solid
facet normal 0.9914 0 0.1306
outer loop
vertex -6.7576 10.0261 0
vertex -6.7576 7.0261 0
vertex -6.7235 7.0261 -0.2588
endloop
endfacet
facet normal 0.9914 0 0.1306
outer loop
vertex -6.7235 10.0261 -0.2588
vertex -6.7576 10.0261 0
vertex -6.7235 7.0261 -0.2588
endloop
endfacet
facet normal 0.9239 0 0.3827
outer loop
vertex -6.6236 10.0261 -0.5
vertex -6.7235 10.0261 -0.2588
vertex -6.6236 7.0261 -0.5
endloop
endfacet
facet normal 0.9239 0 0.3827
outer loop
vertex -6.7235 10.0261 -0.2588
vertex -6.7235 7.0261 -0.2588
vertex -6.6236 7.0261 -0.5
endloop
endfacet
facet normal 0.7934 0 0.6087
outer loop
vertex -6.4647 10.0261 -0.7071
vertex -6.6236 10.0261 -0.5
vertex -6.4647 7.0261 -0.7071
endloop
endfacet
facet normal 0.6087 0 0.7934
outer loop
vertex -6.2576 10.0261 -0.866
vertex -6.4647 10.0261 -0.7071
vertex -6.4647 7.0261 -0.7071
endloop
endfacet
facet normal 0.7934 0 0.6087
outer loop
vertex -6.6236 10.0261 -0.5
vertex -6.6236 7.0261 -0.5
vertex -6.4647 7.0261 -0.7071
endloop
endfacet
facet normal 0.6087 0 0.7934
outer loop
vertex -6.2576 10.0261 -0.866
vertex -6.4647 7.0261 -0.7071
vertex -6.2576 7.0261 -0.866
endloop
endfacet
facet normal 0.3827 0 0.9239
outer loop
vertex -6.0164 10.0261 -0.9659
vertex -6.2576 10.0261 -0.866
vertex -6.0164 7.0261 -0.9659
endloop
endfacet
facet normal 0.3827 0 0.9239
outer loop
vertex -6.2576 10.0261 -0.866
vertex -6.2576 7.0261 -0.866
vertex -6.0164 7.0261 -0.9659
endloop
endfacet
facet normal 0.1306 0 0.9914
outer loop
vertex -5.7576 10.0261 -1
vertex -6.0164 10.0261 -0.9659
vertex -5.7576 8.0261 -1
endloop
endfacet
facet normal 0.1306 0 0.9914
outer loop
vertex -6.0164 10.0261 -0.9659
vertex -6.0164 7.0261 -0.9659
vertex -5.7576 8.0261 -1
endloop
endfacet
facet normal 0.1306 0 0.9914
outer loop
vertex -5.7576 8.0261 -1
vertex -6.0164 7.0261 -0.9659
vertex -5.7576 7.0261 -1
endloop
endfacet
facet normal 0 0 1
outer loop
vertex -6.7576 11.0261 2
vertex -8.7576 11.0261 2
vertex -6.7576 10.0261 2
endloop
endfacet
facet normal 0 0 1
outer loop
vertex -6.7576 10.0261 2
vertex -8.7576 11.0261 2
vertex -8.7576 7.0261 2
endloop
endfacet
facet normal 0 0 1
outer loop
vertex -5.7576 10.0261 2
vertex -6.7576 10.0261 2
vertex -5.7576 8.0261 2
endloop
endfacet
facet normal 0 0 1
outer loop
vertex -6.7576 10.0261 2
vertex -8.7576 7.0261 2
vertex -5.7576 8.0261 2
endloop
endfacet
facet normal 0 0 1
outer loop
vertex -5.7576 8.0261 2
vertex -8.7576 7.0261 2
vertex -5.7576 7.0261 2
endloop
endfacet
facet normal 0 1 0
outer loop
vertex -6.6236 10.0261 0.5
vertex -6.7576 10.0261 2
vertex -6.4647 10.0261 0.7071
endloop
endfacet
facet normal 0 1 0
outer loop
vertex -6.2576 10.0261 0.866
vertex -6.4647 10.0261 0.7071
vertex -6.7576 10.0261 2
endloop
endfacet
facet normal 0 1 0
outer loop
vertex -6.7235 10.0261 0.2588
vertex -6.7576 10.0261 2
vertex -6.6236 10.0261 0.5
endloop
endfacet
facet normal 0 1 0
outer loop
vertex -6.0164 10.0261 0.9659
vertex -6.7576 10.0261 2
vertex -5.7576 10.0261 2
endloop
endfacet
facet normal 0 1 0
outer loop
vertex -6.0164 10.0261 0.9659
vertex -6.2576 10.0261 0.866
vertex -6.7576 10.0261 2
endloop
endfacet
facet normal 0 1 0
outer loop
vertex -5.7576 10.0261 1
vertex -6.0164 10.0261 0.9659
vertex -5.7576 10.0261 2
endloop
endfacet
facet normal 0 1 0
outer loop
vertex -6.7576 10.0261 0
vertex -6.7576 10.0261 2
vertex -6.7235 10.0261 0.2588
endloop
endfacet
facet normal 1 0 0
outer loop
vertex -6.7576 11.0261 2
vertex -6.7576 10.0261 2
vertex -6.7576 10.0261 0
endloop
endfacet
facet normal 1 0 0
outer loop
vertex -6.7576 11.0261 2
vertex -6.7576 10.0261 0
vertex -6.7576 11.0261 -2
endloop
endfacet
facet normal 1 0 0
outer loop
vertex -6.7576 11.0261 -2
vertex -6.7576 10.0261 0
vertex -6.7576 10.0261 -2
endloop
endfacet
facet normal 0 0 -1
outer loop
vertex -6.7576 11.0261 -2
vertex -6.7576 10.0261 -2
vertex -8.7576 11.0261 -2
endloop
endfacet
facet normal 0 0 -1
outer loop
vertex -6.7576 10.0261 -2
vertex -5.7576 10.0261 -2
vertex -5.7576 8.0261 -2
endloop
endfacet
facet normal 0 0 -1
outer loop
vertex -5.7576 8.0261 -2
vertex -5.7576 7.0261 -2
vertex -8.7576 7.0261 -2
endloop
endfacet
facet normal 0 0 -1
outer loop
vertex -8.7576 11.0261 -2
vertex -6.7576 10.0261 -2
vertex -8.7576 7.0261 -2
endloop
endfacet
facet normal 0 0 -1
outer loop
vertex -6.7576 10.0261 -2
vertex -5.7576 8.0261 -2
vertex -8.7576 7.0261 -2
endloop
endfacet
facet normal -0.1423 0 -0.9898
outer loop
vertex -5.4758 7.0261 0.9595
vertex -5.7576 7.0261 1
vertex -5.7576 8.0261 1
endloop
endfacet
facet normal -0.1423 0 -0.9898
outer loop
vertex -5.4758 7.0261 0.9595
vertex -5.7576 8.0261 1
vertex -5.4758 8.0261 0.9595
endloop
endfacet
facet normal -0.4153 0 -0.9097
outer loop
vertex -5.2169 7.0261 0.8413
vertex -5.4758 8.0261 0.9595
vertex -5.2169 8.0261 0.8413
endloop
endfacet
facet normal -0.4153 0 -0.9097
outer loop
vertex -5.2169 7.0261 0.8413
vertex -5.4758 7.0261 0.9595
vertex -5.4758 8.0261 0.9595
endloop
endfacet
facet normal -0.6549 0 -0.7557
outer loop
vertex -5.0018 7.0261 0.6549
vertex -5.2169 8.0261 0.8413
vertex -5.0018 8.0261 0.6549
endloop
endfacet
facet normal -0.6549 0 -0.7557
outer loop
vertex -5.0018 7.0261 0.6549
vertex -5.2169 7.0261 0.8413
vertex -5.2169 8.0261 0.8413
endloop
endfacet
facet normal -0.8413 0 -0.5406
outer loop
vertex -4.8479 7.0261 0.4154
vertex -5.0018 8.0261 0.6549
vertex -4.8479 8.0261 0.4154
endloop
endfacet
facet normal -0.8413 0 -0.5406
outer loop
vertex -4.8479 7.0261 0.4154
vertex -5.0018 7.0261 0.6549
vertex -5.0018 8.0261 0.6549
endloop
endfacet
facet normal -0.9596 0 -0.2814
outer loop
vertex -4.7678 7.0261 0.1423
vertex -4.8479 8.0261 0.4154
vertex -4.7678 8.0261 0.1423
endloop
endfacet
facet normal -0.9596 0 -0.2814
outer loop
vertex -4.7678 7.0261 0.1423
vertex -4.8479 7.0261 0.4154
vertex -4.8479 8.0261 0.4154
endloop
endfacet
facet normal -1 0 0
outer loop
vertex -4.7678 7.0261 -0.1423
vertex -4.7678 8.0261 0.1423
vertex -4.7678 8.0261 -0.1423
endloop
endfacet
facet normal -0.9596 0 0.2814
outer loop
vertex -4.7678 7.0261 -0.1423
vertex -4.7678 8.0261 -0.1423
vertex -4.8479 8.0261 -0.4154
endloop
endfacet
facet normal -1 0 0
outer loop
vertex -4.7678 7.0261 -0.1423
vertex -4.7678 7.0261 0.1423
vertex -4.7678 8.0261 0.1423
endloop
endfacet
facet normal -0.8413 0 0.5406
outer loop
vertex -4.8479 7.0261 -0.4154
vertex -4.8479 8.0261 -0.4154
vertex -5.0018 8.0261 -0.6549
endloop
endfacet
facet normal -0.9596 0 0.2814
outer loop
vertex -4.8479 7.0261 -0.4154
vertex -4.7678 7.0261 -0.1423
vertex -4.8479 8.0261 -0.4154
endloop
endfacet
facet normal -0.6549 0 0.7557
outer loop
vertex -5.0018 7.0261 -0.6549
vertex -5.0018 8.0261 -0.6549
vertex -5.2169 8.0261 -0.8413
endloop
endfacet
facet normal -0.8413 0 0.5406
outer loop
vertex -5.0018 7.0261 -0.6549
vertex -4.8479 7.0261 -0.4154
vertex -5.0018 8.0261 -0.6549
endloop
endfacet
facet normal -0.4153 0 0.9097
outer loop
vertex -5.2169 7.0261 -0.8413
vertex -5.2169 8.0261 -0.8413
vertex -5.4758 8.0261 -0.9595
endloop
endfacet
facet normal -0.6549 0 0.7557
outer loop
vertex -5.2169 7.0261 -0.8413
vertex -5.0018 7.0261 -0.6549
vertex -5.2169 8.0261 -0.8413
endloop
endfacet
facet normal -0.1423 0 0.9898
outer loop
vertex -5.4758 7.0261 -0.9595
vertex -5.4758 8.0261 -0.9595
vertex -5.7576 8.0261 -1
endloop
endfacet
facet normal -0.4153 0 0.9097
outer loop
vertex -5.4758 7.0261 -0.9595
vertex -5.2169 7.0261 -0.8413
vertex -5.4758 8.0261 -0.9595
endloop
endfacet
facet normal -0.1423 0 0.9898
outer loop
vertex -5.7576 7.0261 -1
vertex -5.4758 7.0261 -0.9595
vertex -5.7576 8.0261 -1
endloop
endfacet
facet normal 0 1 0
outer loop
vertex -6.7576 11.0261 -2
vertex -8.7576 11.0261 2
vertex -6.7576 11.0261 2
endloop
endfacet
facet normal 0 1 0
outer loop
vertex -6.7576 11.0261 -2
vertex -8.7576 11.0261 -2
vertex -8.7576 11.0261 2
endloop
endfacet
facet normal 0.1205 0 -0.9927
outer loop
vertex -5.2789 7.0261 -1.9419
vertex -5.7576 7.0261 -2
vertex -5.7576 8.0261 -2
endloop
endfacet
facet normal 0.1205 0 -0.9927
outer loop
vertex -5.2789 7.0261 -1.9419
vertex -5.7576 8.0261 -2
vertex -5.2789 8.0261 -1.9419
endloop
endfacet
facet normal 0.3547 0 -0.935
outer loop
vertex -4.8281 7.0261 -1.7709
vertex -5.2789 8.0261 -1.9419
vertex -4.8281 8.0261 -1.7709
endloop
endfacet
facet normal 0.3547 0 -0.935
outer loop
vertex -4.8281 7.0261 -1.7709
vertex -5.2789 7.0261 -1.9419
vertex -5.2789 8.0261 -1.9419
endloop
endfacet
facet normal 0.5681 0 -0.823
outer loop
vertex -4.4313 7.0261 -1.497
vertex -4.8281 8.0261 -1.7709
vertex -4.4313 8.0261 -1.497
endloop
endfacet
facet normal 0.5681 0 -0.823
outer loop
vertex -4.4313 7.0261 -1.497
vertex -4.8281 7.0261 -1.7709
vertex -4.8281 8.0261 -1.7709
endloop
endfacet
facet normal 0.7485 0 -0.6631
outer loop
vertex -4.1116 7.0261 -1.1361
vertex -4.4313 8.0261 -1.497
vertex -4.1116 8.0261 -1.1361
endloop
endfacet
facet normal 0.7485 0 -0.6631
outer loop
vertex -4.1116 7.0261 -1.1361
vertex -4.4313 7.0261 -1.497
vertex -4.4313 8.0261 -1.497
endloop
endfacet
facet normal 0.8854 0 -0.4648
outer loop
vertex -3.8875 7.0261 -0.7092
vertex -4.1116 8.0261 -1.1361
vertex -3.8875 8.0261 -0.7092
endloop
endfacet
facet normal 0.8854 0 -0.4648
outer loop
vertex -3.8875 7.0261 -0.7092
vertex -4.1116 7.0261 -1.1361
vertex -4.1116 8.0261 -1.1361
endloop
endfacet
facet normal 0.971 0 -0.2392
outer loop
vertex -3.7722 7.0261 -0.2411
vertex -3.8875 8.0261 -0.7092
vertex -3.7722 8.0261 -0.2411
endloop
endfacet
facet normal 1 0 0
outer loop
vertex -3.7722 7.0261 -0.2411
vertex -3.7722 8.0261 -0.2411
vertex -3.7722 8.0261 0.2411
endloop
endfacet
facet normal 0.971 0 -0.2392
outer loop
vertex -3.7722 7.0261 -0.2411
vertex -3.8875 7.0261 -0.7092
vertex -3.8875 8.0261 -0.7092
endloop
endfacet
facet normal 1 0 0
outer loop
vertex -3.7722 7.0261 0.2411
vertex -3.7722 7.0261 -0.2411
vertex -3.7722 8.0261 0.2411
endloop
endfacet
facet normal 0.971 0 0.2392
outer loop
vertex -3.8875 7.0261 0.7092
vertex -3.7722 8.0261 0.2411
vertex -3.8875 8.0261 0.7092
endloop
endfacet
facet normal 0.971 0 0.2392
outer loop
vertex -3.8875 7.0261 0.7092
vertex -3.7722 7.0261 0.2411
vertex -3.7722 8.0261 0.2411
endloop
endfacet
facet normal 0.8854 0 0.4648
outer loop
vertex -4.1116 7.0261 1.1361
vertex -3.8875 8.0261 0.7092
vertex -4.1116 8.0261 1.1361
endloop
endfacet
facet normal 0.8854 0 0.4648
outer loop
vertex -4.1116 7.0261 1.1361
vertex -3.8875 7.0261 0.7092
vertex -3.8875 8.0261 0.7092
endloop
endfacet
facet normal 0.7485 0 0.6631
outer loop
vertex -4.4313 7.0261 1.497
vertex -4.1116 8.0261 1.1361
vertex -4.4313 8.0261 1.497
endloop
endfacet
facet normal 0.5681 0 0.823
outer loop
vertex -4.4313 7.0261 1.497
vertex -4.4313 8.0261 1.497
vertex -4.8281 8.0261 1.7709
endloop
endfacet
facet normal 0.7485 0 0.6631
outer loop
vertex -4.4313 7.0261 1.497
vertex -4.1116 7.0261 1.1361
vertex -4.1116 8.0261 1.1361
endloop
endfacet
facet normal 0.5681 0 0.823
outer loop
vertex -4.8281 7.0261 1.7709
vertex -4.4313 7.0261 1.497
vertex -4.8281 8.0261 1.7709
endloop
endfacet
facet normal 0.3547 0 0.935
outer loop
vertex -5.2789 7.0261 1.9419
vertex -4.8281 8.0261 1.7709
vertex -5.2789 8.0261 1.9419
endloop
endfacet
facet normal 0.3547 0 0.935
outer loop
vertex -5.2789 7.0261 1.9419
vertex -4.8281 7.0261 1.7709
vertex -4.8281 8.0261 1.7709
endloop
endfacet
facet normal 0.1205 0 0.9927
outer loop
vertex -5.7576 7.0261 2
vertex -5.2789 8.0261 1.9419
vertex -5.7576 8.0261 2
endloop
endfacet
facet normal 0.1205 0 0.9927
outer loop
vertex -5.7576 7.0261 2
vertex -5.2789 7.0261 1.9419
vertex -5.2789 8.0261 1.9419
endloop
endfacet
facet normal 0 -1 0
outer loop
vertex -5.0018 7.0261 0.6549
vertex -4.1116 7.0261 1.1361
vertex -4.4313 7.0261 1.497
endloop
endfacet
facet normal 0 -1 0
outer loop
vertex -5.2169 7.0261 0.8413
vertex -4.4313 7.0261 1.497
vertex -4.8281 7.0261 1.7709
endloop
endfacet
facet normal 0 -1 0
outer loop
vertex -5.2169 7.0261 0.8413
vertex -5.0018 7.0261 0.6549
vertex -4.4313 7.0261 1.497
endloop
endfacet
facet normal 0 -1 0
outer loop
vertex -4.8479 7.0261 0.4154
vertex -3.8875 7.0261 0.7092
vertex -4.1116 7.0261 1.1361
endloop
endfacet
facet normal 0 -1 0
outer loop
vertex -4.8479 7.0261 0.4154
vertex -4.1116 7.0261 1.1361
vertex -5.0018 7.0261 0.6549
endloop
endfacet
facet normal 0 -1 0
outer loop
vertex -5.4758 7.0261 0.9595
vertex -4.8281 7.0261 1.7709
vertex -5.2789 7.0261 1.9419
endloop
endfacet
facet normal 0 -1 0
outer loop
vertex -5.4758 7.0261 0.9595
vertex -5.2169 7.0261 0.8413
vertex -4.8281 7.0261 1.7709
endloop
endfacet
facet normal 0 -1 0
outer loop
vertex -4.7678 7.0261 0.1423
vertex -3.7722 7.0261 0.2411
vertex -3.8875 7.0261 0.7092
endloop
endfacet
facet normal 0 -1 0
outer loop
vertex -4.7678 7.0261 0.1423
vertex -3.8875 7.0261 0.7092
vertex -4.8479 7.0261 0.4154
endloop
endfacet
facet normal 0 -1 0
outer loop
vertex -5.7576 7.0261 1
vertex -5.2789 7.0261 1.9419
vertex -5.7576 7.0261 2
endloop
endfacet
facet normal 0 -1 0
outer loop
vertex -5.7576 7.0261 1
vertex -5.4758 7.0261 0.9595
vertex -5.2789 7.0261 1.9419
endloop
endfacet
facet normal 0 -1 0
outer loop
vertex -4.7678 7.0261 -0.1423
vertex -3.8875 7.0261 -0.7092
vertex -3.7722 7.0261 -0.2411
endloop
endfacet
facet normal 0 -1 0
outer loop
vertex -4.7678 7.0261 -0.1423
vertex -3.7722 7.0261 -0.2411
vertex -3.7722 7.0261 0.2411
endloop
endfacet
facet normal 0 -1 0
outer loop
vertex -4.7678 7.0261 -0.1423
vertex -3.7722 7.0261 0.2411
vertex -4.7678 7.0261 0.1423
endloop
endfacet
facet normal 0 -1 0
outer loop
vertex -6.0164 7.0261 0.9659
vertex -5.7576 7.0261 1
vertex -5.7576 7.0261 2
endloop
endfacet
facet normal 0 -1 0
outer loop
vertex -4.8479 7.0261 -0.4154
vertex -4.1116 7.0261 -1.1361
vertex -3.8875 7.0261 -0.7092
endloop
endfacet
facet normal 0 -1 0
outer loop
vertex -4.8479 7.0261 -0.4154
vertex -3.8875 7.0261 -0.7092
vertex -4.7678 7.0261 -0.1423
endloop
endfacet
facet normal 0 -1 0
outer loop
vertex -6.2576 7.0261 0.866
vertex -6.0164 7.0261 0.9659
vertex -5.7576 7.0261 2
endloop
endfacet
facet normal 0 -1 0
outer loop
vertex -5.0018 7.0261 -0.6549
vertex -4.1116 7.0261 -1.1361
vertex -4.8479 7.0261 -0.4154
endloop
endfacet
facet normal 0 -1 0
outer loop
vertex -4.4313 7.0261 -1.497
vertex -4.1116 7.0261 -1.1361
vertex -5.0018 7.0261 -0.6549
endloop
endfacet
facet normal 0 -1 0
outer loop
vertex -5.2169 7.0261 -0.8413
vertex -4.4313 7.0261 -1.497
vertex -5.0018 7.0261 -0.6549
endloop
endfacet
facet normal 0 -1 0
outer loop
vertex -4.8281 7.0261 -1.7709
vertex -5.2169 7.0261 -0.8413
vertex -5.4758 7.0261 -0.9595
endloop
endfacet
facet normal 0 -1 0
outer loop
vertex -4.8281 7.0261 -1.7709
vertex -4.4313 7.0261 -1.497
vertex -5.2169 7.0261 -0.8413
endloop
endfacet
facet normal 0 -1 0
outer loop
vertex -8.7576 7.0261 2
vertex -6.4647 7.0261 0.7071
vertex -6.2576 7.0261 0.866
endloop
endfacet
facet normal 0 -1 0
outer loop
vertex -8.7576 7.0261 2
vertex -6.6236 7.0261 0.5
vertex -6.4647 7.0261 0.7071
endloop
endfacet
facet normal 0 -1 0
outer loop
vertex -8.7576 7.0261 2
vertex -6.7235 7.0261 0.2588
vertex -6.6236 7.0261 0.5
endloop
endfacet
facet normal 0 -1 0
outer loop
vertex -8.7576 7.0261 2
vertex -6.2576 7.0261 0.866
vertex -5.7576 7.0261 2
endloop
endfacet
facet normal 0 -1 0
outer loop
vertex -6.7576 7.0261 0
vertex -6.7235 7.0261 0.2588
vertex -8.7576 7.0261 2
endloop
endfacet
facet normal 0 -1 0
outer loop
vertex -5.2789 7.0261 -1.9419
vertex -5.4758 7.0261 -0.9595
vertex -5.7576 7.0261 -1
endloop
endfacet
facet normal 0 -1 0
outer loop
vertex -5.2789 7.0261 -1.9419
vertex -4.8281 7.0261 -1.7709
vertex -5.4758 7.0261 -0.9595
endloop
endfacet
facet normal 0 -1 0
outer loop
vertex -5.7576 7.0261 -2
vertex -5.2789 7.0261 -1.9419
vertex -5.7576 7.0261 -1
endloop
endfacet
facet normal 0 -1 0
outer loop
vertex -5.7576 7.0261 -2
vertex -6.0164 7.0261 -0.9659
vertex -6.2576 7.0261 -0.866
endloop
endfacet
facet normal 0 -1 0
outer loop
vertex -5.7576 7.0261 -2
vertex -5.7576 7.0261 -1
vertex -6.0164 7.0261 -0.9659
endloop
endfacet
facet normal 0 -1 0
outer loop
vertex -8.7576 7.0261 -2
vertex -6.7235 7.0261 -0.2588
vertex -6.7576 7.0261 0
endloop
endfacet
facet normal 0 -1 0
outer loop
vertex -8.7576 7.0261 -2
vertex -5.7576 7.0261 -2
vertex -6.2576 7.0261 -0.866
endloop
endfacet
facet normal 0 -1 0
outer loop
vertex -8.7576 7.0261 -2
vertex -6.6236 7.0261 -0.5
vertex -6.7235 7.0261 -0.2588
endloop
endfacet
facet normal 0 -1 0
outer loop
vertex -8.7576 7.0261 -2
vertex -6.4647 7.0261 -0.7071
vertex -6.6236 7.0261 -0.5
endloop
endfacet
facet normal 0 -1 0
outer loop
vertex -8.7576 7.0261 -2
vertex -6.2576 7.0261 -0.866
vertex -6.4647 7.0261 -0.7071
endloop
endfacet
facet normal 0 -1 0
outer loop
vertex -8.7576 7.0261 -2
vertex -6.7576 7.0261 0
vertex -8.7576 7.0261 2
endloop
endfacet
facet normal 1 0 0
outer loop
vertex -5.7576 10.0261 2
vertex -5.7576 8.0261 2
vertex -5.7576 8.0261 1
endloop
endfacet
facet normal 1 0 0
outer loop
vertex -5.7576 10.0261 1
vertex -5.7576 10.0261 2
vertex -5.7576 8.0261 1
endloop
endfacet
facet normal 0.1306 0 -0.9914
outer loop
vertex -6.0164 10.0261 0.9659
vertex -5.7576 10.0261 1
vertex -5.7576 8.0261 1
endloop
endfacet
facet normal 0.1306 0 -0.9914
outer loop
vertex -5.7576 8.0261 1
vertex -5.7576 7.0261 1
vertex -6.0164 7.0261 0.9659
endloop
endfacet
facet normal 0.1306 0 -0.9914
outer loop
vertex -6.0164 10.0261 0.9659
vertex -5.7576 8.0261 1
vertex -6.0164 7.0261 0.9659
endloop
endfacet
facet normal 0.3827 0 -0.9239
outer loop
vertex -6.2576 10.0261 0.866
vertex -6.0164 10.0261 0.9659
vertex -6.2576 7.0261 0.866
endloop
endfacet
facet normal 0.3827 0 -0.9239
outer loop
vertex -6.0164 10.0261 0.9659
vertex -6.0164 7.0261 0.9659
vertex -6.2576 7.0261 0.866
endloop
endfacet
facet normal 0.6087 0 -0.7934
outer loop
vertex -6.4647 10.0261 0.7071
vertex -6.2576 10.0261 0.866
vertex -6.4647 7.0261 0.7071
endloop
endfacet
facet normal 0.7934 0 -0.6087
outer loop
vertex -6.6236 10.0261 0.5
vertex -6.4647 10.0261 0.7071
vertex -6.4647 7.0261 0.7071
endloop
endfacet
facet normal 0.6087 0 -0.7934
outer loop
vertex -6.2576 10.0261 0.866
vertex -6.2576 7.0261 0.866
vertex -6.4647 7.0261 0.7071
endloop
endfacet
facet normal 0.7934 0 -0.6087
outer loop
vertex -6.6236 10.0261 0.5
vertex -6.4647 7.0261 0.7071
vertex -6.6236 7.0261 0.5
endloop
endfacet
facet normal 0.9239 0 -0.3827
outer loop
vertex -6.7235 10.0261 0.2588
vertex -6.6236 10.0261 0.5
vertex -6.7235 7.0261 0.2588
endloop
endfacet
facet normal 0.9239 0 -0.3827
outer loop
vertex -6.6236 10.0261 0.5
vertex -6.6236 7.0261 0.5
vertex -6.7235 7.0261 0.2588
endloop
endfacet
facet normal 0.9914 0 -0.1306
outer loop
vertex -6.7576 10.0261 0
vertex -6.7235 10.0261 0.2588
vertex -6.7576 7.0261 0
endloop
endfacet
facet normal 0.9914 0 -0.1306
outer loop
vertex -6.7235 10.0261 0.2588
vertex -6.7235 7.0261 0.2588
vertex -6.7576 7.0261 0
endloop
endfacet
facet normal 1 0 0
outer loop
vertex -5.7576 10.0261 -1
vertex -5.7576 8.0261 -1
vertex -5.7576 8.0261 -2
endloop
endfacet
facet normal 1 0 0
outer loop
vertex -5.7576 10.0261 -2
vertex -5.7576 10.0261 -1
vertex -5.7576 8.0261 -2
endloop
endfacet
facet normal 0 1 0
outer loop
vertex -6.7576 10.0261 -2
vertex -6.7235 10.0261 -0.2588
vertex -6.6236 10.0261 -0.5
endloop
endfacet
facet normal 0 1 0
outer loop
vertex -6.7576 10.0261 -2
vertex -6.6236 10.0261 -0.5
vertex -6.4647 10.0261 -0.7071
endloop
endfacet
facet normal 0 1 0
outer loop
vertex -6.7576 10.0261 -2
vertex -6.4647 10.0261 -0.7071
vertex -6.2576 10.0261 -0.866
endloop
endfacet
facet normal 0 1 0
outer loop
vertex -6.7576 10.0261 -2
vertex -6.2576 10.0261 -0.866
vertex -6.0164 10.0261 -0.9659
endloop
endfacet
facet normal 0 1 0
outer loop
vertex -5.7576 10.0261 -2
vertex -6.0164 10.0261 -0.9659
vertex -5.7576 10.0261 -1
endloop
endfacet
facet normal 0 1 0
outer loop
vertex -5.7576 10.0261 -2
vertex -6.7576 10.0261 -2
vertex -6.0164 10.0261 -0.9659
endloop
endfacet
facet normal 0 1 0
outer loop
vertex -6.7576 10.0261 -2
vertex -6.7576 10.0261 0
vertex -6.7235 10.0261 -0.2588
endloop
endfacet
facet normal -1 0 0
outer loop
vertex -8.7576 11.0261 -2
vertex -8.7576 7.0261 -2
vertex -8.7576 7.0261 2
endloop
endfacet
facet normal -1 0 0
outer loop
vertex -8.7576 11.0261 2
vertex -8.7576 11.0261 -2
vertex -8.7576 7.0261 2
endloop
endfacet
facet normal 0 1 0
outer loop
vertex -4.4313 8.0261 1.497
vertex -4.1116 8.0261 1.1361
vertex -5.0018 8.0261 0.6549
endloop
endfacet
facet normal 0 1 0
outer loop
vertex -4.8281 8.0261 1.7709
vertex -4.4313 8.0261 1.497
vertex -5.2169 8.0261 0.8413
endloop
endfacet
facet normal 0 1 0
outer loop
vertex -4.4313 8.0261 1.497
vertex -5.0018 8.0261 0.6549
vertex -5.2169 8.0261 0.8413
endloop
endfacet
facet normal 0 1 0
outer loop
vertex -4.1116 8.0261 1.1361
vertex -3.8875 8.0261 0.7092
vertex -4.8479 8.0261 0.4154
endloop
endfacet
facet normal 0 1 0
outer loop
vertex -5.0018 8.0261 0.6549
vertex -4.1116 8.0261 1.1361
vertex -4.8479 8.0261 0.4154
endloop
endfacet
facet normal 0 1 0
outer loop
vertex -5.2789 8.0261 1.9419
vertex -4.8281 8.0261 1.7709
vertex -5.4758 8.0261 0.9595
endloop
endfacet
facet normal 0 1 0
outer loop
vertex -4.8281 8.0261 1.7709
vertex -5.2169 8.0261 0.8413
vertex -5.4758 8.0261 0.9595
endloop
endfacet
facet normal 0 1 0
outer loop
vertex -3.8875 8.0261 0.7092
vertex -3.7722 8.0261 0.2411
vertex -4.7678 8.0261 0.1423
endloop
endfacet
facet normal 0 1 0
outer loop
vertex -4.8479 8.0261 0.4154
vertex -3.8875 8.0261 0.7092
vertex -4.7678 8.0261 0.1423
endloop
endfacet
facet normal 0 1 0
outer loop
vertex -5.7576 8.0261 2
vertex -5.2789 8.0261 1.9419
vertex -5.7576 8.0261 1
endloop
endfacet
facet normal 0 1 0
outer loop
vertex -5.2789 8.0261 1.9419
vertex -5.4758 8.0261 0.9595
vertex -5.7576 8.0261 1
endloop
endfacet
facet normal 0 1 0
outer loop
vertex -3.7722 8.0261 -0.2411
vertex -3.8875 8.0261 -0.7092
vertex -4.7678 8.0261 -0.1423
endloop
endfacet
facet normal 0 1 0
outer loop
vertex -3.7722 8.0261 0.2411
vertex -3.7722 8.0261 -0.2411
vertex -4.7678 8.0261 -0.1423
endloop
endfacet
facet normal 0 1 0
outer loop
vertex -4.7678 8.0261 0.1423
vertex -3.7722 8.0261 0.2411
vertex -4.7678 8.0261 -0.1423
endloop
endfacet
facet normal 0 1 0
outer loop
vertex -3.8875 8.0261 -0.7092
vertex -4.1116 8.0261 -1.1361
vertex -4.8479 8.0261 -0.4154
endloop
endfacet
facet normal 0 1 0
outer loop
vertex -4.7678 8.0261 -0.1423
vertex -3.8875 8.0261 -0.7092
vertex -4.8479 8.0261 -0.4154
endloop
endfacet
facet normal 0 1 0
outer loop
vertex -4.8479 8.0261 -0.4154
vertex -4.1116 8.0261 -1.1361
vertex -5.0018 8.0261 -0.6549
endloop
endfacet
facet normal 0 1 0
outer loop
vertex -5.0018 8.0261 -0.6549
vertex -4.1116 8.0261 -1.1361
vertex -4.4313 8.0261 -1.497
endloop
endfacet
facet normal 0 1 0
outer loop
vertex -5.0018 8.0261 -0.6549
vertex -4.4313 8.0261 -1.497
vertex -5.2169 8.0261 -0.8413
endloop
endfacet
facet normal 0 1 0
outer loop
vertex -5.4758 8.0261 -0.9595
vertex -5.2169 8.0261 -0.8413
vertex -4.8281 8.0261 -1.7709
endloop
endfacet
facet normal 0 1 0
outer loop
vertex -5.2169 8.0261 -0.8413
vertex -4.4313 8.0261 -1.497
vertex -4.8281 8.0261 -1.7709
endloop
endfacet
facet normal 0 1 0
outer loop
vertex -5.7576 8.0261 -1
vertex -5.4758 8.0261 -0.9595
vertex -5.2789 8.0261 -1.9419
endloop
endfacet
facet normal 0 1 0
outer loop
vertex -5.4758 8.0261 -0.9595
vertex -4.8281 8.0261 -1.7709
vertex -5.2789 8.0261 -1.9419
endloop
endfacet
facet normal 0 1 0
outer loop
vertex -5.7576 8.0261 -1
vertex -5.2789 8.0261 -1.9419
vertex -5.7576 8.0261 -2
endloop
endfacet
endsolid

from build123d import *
from build123d.topology import SkipClean

# Parameters (mm, degrees)
SKETCH_1_R      = 5.000000000000002
EXTRUDE_2_DEPTH = 5
EXTRUDE_4_DEPTH = 15
EXTRUDE_5_DEPTH = 20
SCALE_1_SCALE   = 0.2


with BuildPart() as part:
    # 草圖1 → 填料-伸長2 (new body)
    with BuildSketch(Plane(origin=(0, 0, 0), x_dir=(1, 0, 0), z_dir=(0, 1, 0))):
        with BuildLine():
            Line((-15, -10.000000000000002), (0, -10))
            ThreePointArc((0, -10), (10, 2.8e-16), (1.22e-15, 10))
            Line((4.1e-16, 10), (-15, 10))
            Line((-15, 9.999999999999998), (-15, -10.000000000000002))
        make_face()
        Circle(SKETCH_1_R, mode=Mode.SUBTRACT)
    extrude(amount=EXTRUDE_2_DEPTH)

    # 草圖1<4> → 填料-伸長4 (add)
    with BuildSketch(Plane(origin=(0, 0, 0), x_dir=(1, 0, 0), z_dir=(0, 1, 0))):
        with BuildLine():
            Line((-15, -10.000000000000002), (0, -10))
            Line((0, -10), (0, -5))
            ThreePointArc((0, -5), (-5, -3.1e-16), (-6.1e-16, 5))
            Line((0, 5), (0, 10))
            Line((4.1e-16, 10), (-15, 10))
            Line((-15, 9.999999999999998), (-15, -10.000000000000002))
        make_face()
    extrude(amount=EXTRUDE_4_DEPTH)

    # 草圖1<5> → 填料-伸長5 (add)
    with SkipClean():  # the faces are left unmerged after this step: merging them gives an invalid solid
        with BuildSketch(Plane(origin=(0, 0, 0), x_dir=(1, 0, 0), z_dir=(0, 1, 0))):
            Polygon((-15, -10.000000000000002), (-5, -10), (-5, -3.55e-15), (-5, 10), (-15, 10), align=None)
        extrude(amount=EXTRUDE_5_DEPTH)


with BuildPart() as part_1:
    # 縮放比例1: scaled about (-7.196969697, 8.78268307, 0)
    add(part.part.scale(SCALE_1_SCALE).moved(Location((-5.757575757600001, 7.026146455999999, 0))))


solid = part_1.part
